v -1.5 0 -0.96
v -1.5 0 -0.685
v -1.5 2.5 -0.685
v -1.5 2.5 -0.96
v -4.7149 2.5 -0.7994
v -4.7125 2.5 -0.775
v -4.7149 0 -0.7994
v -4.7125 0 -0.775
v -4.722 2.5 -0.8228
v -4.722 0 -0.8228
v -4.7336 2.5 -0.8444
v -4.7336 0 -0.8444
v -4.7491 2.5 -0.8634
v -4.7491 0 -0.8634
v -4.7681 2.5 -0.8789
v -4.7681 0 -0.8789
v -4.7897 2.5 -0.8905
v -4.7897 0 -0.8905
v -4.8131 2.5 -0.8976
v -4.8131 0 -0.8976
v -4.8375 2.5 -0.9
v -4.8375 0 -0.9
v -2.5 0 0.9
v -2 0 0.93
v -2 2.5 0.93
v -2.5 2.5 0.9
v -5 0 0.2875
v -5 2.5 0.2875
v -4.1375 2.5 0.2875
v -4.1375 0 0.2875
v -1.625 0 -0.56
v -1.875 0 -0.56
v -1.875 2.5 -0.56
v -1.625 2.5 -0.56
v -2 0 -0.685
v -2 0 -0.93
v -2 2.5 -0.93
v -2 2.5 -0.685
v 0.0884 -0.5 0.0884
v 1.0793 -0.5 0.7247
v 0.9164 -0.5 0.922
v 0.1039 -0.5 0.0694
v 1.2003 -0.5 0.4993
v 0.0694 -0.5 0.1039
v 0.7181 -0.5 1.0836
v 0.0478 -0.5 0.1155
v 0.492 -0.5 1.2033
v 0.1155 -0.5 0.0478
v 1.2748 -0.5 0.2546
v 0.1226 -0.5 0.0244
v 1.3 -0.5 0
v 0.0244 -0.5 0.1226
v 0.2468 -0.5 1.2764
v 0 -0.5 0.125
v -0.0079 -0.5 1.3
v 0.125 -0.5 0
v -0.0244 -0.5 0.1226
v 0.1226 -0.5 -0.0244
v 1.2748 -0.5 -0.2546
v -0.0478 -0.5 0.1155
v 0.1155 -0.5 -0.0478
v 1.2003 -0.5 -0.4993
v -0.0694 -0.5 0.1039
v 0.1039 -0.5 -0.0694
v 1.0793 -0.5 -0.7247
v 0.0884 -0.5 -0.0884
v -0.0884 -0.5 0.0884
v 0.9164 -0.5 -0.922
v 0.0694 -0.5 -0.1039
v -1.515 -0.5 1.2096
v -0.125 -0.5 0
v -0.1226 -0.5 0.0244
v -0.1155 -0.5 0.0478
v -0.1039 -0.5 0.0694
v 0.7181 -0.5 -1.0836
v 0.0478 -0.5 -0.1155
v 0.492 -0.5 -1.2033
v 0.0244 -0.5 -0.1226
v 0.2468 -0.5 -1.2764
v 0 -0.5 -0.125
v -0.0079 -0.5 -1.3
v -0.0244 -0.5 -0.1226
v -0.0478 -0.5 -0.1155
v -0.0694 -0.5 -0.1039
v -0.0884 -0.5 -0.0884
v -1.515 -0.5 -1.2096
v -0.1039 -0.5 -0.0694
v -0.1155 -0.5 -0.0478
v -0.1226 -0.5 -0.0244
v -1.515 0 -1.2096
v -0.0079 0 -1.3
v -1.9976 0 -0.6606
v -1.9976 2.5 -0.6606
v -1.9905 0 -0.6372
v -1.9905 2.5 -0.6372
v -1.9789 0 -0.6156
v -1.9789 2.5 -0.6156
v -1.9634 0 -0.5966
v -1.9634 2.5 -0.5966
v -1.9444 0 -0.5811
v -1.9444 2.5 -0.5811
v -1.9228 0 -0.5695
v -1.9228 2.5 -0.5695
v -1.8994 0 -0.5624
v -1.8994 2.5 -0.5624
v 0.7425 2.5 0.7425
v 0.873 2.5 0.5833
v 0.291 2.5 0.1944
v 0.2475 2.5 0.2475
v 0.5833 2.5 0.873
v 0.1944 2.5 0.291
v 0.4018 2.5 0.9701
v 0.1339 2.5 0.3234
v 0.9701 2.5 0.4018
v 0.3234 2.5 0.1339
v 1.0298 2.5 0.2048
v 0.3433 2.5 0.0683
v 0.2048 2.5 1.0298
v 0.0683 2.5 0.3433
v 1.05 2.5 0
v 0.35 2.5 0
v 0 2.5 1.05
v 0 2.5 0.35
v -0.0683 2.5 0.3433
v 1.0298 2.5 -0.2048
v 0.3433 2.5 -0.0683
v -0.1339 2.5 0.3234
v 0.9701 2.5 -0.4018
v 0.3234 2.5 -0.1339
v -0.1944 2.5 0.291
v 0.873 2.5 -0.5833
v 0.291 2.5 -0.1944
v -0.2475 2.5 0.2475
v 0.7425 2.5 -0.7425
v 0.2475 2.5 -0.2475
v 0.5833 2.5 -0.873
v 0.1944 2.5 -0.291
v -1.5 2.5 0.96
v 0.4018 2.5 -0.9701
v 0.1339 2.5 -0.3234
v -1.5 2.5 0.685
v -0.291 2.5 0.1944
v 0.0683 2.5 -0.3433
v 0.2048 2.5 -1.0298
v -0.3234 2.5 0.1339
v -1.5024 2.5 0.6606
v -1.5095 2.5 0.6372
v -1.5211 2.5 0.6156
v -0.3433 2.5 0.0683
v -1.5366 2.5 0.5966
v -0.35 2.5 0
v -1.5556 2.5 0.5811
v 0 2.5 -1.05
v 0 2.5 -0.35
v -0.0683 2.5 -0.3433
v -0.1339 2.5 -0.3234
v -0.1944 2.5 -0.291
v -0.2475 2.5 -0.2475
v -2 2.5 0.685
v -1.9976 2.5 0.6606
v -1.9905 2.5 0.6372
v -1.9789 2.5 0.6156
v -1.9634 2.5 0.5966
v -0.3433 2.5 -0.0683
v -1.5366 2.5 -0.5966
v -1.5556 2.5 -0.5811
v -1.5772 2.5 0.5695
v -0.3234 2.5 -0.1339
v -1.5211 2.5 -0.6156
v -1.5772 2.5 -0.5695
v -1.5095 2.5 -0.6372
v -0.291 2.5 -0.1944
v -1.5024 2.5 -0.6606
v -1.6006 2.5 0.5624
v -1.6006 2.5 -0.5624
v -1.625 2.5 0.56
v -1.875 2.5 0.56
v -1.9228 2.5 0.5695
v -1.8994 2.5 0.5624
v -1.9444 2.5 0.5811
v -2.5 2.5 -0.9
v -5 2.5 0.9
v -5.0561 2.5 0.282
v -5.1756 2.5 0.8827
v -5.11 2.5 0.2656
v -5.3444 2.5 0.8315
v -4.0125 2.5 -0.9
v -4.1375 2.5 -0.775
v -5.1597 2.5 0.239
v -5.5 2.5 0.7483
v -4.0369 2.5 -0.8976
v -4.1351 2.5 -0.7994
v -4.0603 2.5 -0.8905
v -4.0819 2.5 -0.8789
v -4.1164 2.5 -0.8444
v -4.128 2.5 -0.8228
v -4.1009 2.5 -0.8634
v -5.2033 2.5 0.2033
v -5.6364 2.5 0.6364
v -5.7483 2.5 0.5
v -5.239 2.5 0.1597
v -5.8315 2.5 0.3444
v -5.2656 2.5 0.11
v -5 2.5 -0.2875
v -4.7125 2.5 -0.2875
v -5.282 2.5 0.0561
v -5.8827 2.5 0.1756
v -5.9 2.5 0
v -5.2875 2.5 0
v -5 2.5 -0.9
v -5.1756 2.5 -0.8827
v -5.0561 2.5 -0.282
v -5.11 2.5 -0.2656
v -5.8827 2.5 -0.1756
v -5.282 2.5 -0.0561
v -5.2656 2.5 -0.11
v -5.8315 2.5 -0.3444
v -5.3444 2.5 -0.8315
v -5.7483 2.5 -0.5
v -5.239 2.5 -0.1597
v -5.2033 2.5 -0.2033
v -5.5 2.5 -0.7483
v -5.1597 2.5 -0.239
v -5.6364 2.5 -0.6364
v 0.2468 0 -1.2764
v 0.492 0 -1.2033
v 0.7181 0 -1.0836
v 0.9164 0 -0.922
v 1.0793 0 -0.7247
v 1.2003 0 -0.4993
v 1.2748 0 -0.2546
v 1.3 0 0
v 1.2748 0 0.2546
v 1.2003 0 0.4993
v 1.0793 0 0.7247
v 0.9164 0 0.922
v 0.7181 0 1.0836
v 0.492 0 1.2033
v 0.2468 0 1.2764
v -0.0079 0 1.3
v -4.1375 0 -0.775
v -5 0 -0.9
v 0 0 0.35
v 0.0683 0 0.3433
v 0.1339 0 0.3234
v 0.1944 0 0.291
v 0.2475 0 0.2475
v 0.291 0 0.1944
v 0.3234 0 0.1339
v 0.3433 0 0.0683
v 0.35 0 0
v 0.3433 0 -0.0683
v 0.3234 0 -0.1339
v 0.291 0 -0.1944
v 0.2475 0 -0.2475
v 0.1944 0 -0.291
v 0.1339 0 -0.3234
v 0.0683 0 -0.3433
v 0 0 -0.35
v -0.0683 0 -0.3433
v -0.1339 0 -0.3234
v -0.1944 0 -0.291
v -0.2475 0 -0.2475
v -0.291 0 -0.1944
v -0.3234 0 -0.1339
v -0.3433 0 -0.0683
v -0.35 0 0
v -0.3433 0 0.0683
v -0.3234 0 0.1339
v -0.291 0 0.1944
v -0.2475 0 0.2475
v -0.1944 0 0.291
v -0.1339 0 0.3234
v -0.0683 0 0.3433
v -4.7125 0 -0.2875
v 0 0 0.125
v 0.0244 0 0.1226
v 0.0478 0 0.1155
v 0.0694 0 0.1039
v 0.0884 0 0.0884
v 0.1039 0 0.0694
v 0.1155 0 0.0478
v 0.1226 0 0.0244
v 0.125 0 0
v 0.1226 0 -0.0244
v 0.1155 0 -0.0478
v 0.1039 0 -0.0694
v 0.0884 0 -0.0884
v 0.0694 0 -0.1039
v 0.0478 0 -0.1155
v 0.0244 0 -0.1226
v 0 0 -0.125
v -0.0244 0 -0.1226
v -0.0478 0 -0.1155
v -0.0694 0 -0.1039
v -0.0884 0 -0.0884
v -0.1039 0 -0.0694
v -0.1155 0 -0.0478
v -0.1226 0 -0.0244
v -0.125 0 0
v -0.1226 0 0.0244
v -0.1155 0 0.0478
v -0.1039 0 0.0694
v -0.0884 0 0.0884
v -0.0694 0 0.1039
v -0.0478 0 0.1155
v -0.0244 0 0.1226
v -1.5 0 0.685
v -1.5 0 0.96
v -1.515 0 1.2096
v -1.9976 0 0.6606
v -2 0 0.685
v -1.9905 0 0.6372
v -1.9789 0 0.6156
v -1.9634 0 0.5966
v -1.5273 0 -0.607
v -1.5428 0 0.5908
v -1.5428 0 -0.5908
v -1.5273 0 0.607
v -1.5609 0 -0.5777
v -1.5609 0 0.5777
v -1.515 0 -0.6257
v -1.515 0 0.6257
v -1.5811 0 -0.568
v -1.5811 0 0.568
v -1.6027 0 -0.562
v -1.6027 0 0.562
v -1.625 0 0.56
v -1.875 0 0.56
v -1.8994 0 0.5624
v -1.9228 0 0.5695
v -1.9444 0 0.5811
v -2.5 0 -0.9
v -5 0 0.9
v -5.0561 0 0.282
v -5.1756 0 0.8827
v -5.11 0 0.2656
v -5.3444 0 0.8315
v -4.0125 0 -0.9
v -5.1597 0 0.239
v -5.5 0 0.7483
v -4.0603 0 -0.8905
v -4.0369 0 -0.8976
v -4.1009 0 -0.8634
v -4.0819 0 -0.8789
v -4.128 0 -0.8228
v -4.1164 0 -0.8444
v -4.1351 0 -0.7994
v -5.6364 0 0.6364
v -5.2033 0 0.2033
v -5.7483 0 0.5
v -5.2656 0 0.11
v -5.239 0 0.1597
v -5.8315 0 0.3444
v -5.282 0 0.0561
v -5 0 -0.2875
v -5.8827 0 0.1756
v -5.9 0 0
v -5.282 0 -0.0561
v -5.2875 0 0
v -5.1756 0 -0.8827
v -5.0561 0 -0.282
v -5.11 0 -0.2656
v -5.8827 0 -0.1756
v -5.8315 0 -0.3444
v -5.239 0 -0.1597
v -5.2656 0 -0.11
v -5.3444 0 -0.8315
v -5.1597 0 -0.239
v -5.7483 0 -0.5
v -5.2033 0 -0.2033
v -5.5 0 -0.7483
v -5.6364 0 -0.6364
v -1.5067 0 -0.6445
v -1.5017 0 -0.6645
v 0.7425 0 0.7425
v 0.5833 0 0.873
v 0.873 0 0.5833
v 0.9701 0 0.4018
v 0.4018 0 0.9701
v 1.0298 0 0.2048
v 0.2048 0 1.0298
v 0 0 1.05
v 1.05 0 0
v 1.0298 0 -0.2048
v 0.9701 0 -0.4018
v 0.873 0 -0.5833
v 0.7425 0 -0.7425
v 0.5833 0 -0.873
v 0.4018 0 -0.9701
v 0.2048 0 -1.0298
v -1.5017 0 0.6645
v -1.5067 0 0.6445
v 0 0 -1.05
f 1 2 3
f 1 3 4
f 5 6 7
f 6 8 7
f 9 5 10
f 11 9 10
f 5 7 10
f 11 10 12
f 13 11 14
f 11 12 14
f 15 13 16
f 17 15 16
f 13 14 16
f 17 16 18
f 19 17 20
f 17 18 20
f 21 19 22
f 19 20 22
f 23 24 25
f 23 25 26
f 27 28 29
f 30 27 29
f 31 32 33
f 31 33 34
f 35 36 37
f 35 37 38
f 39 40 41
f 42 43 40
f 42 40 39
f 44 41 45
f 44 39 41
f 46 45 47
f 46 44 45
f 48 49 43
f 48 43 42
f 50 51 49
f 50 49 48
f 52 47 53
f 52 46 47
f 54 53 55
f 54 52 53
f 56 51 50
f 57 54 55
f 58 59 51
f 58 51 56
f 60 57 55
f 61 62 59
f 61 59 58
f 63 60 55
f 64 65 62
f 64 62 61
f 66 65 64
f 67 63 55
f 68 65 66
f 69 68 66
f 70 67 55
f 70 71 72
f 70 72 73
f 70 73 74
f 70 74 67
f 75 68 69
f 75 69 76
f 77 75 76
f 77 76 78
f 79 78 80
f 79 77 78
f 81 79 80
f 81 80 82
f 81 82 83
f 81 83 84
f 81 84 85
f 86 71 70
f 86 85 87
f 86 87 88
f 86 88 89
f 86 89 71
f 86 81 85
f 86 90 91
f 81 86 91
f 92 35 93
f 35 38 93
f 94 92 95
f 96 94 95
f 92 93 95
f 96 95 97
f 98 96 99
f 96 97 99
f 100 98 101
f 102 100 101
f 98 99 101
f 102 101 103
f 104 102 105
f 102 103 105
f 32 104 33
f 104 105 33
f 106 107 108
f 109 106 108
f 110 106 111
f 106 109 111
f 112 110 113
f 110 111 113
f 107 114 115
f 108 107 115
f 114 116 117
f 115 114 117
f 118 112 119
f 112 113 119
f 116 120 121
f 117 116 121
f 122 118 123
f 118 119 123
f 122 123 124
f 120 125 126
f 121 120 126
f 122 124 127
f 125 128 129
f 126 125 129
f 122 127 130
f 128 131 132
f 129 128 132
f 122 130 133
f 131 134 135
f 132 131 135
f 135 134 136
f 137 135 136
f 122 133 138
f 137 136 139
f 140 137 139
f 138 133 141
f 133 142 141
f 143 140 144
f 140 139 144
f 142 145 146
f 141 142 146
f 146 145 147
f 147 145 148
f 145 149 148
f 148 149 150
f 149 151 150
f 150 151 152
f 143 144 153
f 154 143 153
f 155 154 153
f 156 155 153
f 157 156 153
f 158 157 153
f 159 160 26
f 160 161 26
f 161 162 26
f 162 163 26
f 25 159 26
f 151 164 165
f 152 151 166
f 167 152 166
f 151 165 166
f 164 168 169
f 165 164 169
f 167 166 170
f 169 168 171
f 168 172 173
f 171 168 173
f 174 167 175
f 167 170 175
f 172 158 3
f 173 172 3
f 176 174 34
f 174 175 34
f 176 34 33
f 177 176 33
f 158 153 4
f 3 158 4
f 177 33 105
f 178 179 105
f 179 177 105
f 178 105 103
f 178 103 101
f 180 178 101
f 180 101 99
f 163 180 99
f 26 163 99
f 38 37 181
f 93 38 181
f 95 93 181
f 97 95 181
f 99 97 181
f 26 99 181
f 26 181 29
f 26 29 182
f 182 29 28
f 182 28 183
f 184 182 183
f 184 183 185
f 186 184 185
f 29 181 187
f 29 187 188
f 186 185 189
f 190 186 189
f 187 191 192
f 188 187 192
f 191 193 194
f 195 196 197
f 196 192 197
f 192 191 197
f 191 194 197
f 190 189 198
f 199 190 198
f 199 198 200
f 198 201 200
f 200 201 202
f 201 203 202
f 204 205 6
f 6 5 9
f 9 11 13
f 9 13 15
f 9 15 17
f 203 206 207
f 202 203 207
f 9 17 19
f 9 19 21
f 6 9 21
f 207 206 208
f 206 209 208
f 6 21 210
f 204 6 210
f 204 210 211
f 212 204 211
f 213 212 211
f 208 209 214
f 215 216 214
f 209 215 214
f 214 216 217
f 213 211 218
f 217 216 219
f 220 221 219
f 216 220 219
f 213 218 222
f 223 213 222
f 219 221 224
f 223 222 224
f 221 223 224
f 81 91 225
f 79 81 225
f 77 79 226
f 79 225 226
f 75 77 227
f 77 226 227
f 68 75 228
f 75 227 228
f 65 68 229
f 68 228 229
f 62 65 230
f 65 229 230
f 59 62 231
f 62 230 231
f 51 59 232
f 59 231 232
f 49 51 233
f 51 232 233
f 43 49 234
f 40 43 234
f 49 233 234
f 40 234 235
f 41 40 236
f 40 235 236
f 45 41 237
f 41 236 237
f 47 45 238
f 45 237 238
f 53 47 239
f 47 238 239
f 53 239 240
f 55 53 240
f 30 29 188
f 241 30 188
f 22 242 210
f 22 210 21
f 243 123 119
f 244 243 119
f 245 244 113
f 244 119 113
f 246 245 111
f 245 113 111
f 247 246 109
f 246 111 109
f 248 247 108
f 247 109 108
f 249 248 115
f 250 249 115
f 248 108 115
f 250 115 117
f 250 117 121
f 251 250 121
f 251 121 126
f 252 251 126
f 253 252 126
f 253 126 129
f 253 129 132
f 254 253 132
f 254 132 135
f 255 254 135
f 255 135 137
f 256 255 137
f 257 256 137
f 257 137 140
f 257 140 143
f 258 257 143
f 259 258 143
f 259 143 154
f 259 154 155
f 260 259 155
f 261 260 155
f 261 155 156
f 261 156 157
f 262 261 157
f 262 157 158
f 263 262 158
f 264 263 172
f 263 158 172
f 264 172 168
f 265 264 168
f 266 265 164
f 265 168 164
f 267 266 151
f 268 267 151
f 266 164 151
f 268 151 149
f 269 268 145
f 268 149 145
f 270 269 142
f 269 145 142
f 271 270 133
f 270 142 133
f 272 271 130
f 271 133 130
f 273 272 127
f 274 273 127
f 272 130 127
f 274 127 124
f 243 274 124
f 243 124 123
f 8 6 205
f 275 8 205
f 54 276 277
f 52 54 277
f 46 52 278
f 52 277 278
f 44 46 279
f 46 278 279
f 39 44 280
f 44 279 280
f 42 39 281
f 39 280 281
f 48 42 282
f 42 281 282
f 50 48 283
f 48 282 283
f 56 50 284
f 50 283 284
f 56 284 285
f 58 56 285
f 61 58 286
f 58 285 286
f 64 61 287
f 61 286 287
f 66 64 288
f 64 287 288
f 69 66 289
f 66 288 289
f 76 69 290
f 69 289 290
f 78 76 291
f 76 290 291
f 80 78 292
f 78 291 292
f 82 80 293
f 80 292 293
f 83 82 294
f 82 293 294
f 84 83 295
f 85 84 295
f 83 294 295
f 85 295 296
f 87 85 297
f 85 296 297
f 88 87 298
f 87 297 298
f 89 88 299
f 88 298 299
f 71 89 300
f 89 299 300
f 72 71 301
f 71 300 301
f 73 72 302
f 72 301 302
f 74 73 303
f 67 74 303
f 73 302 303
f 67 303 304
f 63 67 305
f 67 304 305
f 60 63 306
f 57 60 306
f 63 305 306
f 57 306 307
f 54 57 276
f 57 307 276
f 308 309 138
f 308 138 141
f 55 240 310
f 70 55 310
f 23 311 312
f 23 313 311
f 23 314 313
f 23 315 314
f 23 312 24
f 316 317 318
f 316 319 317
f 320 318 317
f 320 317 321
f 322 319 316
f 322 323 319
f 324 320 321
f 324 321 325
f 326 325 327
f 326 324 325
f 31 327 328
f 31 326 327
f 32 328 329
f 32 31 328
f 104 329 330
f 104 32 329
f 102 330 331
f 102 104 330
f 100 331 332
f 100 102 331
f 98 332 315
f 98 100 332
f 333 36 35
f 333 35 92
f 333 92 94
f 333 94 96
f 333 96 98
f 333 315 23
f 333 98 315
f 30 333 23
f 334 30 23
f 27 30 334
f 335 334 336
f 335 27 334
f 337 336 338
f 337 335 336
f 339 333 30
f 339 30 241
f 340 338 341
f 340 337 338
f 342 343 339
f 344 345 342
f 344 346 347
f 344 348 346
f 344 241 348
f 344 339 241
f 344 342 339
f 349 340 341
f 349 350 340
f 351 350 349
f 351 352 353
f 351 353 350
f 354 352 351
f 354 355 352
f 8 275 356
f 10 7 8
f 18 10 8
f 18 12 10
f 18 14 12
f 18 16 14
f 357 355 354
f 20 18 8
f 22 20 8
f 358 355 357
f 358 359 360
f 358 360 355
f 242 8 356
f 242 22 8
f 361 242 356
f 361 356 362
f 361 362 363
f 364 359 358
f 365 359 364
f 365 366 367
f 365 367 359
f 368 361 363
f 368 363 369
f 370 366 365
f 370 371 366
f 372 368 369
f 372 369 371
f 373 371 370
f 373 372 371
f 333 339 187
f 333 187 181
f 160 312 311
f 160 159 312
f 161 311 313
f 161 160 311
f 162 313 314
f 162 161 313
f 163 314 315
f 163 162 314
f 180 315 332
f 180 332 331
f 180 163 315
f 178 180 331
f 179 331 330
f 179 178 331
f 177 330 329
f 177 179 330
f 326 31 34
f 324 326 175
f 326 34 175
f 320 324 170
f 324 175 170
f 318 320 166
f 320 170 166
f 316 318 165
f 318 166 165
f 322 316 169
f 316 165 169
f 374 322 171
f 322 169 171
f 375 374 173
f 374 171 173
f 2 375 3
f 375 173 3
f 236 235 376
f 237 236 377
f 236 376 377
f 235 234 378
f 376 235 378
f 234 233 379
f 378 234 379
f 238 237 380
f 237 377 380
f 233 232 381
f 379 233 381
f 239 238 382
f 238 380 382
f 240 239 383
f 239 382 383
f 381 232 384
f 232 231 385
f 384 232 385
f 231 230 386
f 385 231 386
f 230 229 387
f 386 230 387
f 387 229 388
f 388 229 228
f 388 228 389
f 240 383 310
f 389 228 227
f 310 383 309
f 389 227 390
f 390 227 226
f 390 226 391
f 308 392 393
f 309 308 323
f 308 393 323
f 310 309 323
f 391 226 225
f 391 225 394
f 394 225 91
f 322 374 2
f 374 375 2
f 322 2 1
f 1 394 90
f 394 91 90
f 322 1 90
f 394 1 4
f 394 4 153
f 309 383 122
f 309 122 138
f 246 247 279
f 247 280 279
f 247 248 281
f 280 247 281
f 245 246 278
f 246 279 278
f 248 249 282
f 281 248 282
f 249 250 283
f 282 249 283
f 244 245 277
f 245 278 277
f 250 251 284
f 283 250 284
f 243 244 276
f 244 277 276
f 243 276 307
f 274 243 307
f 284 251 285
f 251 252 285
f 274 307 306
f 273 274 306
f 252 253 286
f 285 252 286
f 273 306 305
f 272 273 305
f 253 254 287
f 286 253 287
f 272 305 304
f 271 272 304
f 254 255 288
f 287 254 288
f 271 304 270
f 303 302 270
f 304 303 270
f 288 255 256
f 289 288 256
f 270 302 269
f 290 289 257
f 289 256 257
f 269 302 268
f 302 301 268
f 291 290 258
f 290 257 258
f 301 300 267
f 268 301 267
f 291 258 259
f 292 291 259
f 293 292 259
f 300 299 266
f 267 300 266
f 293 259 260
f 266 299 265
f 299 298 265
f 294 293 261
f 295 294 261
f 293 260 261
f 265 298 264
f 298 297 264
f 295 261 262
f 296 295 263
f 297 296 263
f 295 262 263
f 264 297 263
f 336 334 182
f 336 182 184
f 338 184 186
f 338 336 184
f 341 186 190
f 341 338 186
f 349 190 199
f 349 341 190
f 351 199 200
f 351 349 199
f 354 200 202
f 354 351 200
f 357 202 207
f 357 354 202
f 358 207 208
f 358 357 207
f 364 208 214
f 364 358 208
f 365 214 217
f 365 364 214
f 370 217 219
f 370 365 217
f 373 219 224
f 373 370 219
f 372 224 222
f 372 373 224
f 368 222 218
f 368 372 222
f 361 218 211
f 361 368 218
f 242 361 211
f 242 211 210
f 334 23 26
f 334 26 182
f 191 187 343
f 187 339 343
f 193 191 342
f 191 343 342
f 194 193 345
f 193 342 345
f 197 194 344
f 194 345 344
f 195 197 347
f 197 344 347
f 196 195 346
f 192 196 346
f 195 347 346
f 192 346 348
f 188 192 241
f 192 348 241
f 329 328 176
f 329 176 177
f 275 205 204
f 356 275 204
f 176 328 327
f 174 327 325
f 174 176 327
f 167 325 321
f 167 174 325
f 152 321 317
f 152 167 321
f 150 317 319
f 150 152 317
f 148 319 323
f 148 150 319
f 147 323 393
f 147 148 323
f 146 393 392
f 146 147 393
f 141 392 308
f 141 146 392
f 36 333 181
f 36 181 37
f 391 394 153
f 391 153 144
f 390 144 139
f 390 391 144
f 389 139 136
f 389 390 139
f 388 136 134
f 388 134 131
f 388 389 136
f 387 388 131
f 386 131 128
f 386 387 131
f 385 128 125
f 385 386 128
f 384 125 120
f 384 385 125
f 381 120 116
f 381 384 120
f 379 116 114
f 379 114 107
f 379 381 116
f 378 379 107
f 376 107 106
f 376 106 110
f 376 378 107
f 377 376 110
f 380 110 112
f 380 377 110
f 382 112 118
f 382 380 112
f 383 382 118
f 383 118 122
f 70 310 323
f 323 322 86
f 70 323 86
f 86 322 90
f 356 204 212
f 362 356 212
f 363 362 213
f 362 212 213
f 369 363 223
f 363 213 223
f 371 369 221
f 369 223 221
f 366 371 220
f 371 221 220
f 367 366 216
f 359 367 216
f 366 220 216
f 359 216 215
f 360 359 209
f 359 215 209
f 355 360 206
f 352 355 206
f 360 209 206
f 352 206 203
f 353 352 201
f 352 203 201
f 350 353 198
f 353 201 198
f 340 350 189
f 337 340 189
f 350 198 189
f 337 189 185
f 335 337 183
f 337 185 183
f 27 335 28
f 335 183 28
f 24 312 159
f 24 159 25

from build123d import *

# Parameters (mm, degrees)
BOSS_EXTRUDE1_DEPTH = 2.5
SKETCH4_R           = 0.35
THROUGH_HOLES_DEPTH = 7.493265742
FILLET1_R           = 0.125
SKETCH5_R           = 0.125
BOSS_EXTRUDE2_DEPTH = 0.5


with BuildPart() as part:
    # Sketch3 → Boss-Extrude1 (new body)
    with BuildSketch(Plane(origin=(0, 0, 0), x_dir=(1, 0, 0), z_dir=(0, 1, 0))):
        with BuildLine():
            Line((-2.5, 0.9), (-2, 0.93))
            Line((-2, 0.93), (-2, 0.56))
            Line((-2, 0.56), (-1.5, 0.56))
            Line((-1.5, 0.56), (-1.5, 0.96))
            Line((-1.5, 0.96), (0, 1.05))
            ThreePointArc((0, 1.05), (1.05, 0), (0, -1.05))
            Line((0, -1.05), (-1.5, -0.96))
            Line((-1.5, -0.96), (-1.5, -0.56))
            Line((-1.5, -0.56), (-2, -0.56))
            Line((-2, -0.56), (-2, -0.93))
            Line((-2, -0.93), (-2.5, -0.9))
            Line((-2.5, -0.9), (-5, -0.9))
            ThreePointArc((-5, -0.9), (-5.9, 0), (-5, 0.9))
            Line((-5, 0.9), (-2.5, 0.9))
        make_face()
    extrude(amount=BOSS_EXTRUDE1_DEPTH)

    # Sketch4 → Through Holes (cut, through all)
    with BuildSketch(Plane(origin=(0, 2.5, 0), x_dir=(1, 0, 0), z_dir=(0, 1, 0))):
        with BuildLine():
            Line((-4.1375, 0.9), (-4.7125, 0.9))
            Line((-4.7125, 0.9), (-4.7125, 0.2875))
            Line((-4.7125, 0.2875), (-5, 0.2875))
            ThreePointArc((-5, 0.2875), (-5.2875, 0), (-5, -0.2875))
            Line((-5, -0.2875), (-4.1375, -0.2875))
            Line((-4.1375, -0.2875), (-4.1375, 0.9))
        make_face()
        with Locations(Location((0, 0, 0), (0, 0, 270))):
            Circle(SKETCH4_R)
    extrude(amount=-THROUGH_HOLES_DEPTH, mode=Mode.SUBTRACT)

    # Fillet1
    fillet1_edges = [part.edges().sort_by_distance(p)[0] for p in [
        (-2, 1.25, 0.56),
        (-1.5, 1.25, 0.56),
        (-1.5, 1.25, -0.56),
        (-2, 1.25, -0.56),
        (-4.7125, 1.25, -0.9),
        (-4.1375, 1.25, -0.9),
    ]]
    fillet(fillet1_edges, radius=FILLET1_R)

    # Sketch5 → Boss-Extrude2 (add)
    with BuildSketch(Plane(origin=(0, 0, 0), x_dir=(1, 0, 0), z_dir=(0, 1, 0))):
        with BuildLine():
            Line((-1.514973073, -1.209551211), (-1.514973073, 1.209551211))
            Line((-1.514973073, 1.209551211), (-0.007892579, 1.299976041))
            ThreePointArc((-0.007892579, 1.299976041), (1.3, 0), (-0.007892579, -1.299976041))
            Line((-0.007892579, -1.299976041), (-1.514973073, -1.209551211))
        make_face()
        with Locations(Location((0, 0, 0), (0, 0, 270))):
            Circle(SKETCH5_R, mode=Mode.SUBTRACT)
    extrude(amount=-BOSS_EXTRUDE2_DEPTH)


solid = part.part
